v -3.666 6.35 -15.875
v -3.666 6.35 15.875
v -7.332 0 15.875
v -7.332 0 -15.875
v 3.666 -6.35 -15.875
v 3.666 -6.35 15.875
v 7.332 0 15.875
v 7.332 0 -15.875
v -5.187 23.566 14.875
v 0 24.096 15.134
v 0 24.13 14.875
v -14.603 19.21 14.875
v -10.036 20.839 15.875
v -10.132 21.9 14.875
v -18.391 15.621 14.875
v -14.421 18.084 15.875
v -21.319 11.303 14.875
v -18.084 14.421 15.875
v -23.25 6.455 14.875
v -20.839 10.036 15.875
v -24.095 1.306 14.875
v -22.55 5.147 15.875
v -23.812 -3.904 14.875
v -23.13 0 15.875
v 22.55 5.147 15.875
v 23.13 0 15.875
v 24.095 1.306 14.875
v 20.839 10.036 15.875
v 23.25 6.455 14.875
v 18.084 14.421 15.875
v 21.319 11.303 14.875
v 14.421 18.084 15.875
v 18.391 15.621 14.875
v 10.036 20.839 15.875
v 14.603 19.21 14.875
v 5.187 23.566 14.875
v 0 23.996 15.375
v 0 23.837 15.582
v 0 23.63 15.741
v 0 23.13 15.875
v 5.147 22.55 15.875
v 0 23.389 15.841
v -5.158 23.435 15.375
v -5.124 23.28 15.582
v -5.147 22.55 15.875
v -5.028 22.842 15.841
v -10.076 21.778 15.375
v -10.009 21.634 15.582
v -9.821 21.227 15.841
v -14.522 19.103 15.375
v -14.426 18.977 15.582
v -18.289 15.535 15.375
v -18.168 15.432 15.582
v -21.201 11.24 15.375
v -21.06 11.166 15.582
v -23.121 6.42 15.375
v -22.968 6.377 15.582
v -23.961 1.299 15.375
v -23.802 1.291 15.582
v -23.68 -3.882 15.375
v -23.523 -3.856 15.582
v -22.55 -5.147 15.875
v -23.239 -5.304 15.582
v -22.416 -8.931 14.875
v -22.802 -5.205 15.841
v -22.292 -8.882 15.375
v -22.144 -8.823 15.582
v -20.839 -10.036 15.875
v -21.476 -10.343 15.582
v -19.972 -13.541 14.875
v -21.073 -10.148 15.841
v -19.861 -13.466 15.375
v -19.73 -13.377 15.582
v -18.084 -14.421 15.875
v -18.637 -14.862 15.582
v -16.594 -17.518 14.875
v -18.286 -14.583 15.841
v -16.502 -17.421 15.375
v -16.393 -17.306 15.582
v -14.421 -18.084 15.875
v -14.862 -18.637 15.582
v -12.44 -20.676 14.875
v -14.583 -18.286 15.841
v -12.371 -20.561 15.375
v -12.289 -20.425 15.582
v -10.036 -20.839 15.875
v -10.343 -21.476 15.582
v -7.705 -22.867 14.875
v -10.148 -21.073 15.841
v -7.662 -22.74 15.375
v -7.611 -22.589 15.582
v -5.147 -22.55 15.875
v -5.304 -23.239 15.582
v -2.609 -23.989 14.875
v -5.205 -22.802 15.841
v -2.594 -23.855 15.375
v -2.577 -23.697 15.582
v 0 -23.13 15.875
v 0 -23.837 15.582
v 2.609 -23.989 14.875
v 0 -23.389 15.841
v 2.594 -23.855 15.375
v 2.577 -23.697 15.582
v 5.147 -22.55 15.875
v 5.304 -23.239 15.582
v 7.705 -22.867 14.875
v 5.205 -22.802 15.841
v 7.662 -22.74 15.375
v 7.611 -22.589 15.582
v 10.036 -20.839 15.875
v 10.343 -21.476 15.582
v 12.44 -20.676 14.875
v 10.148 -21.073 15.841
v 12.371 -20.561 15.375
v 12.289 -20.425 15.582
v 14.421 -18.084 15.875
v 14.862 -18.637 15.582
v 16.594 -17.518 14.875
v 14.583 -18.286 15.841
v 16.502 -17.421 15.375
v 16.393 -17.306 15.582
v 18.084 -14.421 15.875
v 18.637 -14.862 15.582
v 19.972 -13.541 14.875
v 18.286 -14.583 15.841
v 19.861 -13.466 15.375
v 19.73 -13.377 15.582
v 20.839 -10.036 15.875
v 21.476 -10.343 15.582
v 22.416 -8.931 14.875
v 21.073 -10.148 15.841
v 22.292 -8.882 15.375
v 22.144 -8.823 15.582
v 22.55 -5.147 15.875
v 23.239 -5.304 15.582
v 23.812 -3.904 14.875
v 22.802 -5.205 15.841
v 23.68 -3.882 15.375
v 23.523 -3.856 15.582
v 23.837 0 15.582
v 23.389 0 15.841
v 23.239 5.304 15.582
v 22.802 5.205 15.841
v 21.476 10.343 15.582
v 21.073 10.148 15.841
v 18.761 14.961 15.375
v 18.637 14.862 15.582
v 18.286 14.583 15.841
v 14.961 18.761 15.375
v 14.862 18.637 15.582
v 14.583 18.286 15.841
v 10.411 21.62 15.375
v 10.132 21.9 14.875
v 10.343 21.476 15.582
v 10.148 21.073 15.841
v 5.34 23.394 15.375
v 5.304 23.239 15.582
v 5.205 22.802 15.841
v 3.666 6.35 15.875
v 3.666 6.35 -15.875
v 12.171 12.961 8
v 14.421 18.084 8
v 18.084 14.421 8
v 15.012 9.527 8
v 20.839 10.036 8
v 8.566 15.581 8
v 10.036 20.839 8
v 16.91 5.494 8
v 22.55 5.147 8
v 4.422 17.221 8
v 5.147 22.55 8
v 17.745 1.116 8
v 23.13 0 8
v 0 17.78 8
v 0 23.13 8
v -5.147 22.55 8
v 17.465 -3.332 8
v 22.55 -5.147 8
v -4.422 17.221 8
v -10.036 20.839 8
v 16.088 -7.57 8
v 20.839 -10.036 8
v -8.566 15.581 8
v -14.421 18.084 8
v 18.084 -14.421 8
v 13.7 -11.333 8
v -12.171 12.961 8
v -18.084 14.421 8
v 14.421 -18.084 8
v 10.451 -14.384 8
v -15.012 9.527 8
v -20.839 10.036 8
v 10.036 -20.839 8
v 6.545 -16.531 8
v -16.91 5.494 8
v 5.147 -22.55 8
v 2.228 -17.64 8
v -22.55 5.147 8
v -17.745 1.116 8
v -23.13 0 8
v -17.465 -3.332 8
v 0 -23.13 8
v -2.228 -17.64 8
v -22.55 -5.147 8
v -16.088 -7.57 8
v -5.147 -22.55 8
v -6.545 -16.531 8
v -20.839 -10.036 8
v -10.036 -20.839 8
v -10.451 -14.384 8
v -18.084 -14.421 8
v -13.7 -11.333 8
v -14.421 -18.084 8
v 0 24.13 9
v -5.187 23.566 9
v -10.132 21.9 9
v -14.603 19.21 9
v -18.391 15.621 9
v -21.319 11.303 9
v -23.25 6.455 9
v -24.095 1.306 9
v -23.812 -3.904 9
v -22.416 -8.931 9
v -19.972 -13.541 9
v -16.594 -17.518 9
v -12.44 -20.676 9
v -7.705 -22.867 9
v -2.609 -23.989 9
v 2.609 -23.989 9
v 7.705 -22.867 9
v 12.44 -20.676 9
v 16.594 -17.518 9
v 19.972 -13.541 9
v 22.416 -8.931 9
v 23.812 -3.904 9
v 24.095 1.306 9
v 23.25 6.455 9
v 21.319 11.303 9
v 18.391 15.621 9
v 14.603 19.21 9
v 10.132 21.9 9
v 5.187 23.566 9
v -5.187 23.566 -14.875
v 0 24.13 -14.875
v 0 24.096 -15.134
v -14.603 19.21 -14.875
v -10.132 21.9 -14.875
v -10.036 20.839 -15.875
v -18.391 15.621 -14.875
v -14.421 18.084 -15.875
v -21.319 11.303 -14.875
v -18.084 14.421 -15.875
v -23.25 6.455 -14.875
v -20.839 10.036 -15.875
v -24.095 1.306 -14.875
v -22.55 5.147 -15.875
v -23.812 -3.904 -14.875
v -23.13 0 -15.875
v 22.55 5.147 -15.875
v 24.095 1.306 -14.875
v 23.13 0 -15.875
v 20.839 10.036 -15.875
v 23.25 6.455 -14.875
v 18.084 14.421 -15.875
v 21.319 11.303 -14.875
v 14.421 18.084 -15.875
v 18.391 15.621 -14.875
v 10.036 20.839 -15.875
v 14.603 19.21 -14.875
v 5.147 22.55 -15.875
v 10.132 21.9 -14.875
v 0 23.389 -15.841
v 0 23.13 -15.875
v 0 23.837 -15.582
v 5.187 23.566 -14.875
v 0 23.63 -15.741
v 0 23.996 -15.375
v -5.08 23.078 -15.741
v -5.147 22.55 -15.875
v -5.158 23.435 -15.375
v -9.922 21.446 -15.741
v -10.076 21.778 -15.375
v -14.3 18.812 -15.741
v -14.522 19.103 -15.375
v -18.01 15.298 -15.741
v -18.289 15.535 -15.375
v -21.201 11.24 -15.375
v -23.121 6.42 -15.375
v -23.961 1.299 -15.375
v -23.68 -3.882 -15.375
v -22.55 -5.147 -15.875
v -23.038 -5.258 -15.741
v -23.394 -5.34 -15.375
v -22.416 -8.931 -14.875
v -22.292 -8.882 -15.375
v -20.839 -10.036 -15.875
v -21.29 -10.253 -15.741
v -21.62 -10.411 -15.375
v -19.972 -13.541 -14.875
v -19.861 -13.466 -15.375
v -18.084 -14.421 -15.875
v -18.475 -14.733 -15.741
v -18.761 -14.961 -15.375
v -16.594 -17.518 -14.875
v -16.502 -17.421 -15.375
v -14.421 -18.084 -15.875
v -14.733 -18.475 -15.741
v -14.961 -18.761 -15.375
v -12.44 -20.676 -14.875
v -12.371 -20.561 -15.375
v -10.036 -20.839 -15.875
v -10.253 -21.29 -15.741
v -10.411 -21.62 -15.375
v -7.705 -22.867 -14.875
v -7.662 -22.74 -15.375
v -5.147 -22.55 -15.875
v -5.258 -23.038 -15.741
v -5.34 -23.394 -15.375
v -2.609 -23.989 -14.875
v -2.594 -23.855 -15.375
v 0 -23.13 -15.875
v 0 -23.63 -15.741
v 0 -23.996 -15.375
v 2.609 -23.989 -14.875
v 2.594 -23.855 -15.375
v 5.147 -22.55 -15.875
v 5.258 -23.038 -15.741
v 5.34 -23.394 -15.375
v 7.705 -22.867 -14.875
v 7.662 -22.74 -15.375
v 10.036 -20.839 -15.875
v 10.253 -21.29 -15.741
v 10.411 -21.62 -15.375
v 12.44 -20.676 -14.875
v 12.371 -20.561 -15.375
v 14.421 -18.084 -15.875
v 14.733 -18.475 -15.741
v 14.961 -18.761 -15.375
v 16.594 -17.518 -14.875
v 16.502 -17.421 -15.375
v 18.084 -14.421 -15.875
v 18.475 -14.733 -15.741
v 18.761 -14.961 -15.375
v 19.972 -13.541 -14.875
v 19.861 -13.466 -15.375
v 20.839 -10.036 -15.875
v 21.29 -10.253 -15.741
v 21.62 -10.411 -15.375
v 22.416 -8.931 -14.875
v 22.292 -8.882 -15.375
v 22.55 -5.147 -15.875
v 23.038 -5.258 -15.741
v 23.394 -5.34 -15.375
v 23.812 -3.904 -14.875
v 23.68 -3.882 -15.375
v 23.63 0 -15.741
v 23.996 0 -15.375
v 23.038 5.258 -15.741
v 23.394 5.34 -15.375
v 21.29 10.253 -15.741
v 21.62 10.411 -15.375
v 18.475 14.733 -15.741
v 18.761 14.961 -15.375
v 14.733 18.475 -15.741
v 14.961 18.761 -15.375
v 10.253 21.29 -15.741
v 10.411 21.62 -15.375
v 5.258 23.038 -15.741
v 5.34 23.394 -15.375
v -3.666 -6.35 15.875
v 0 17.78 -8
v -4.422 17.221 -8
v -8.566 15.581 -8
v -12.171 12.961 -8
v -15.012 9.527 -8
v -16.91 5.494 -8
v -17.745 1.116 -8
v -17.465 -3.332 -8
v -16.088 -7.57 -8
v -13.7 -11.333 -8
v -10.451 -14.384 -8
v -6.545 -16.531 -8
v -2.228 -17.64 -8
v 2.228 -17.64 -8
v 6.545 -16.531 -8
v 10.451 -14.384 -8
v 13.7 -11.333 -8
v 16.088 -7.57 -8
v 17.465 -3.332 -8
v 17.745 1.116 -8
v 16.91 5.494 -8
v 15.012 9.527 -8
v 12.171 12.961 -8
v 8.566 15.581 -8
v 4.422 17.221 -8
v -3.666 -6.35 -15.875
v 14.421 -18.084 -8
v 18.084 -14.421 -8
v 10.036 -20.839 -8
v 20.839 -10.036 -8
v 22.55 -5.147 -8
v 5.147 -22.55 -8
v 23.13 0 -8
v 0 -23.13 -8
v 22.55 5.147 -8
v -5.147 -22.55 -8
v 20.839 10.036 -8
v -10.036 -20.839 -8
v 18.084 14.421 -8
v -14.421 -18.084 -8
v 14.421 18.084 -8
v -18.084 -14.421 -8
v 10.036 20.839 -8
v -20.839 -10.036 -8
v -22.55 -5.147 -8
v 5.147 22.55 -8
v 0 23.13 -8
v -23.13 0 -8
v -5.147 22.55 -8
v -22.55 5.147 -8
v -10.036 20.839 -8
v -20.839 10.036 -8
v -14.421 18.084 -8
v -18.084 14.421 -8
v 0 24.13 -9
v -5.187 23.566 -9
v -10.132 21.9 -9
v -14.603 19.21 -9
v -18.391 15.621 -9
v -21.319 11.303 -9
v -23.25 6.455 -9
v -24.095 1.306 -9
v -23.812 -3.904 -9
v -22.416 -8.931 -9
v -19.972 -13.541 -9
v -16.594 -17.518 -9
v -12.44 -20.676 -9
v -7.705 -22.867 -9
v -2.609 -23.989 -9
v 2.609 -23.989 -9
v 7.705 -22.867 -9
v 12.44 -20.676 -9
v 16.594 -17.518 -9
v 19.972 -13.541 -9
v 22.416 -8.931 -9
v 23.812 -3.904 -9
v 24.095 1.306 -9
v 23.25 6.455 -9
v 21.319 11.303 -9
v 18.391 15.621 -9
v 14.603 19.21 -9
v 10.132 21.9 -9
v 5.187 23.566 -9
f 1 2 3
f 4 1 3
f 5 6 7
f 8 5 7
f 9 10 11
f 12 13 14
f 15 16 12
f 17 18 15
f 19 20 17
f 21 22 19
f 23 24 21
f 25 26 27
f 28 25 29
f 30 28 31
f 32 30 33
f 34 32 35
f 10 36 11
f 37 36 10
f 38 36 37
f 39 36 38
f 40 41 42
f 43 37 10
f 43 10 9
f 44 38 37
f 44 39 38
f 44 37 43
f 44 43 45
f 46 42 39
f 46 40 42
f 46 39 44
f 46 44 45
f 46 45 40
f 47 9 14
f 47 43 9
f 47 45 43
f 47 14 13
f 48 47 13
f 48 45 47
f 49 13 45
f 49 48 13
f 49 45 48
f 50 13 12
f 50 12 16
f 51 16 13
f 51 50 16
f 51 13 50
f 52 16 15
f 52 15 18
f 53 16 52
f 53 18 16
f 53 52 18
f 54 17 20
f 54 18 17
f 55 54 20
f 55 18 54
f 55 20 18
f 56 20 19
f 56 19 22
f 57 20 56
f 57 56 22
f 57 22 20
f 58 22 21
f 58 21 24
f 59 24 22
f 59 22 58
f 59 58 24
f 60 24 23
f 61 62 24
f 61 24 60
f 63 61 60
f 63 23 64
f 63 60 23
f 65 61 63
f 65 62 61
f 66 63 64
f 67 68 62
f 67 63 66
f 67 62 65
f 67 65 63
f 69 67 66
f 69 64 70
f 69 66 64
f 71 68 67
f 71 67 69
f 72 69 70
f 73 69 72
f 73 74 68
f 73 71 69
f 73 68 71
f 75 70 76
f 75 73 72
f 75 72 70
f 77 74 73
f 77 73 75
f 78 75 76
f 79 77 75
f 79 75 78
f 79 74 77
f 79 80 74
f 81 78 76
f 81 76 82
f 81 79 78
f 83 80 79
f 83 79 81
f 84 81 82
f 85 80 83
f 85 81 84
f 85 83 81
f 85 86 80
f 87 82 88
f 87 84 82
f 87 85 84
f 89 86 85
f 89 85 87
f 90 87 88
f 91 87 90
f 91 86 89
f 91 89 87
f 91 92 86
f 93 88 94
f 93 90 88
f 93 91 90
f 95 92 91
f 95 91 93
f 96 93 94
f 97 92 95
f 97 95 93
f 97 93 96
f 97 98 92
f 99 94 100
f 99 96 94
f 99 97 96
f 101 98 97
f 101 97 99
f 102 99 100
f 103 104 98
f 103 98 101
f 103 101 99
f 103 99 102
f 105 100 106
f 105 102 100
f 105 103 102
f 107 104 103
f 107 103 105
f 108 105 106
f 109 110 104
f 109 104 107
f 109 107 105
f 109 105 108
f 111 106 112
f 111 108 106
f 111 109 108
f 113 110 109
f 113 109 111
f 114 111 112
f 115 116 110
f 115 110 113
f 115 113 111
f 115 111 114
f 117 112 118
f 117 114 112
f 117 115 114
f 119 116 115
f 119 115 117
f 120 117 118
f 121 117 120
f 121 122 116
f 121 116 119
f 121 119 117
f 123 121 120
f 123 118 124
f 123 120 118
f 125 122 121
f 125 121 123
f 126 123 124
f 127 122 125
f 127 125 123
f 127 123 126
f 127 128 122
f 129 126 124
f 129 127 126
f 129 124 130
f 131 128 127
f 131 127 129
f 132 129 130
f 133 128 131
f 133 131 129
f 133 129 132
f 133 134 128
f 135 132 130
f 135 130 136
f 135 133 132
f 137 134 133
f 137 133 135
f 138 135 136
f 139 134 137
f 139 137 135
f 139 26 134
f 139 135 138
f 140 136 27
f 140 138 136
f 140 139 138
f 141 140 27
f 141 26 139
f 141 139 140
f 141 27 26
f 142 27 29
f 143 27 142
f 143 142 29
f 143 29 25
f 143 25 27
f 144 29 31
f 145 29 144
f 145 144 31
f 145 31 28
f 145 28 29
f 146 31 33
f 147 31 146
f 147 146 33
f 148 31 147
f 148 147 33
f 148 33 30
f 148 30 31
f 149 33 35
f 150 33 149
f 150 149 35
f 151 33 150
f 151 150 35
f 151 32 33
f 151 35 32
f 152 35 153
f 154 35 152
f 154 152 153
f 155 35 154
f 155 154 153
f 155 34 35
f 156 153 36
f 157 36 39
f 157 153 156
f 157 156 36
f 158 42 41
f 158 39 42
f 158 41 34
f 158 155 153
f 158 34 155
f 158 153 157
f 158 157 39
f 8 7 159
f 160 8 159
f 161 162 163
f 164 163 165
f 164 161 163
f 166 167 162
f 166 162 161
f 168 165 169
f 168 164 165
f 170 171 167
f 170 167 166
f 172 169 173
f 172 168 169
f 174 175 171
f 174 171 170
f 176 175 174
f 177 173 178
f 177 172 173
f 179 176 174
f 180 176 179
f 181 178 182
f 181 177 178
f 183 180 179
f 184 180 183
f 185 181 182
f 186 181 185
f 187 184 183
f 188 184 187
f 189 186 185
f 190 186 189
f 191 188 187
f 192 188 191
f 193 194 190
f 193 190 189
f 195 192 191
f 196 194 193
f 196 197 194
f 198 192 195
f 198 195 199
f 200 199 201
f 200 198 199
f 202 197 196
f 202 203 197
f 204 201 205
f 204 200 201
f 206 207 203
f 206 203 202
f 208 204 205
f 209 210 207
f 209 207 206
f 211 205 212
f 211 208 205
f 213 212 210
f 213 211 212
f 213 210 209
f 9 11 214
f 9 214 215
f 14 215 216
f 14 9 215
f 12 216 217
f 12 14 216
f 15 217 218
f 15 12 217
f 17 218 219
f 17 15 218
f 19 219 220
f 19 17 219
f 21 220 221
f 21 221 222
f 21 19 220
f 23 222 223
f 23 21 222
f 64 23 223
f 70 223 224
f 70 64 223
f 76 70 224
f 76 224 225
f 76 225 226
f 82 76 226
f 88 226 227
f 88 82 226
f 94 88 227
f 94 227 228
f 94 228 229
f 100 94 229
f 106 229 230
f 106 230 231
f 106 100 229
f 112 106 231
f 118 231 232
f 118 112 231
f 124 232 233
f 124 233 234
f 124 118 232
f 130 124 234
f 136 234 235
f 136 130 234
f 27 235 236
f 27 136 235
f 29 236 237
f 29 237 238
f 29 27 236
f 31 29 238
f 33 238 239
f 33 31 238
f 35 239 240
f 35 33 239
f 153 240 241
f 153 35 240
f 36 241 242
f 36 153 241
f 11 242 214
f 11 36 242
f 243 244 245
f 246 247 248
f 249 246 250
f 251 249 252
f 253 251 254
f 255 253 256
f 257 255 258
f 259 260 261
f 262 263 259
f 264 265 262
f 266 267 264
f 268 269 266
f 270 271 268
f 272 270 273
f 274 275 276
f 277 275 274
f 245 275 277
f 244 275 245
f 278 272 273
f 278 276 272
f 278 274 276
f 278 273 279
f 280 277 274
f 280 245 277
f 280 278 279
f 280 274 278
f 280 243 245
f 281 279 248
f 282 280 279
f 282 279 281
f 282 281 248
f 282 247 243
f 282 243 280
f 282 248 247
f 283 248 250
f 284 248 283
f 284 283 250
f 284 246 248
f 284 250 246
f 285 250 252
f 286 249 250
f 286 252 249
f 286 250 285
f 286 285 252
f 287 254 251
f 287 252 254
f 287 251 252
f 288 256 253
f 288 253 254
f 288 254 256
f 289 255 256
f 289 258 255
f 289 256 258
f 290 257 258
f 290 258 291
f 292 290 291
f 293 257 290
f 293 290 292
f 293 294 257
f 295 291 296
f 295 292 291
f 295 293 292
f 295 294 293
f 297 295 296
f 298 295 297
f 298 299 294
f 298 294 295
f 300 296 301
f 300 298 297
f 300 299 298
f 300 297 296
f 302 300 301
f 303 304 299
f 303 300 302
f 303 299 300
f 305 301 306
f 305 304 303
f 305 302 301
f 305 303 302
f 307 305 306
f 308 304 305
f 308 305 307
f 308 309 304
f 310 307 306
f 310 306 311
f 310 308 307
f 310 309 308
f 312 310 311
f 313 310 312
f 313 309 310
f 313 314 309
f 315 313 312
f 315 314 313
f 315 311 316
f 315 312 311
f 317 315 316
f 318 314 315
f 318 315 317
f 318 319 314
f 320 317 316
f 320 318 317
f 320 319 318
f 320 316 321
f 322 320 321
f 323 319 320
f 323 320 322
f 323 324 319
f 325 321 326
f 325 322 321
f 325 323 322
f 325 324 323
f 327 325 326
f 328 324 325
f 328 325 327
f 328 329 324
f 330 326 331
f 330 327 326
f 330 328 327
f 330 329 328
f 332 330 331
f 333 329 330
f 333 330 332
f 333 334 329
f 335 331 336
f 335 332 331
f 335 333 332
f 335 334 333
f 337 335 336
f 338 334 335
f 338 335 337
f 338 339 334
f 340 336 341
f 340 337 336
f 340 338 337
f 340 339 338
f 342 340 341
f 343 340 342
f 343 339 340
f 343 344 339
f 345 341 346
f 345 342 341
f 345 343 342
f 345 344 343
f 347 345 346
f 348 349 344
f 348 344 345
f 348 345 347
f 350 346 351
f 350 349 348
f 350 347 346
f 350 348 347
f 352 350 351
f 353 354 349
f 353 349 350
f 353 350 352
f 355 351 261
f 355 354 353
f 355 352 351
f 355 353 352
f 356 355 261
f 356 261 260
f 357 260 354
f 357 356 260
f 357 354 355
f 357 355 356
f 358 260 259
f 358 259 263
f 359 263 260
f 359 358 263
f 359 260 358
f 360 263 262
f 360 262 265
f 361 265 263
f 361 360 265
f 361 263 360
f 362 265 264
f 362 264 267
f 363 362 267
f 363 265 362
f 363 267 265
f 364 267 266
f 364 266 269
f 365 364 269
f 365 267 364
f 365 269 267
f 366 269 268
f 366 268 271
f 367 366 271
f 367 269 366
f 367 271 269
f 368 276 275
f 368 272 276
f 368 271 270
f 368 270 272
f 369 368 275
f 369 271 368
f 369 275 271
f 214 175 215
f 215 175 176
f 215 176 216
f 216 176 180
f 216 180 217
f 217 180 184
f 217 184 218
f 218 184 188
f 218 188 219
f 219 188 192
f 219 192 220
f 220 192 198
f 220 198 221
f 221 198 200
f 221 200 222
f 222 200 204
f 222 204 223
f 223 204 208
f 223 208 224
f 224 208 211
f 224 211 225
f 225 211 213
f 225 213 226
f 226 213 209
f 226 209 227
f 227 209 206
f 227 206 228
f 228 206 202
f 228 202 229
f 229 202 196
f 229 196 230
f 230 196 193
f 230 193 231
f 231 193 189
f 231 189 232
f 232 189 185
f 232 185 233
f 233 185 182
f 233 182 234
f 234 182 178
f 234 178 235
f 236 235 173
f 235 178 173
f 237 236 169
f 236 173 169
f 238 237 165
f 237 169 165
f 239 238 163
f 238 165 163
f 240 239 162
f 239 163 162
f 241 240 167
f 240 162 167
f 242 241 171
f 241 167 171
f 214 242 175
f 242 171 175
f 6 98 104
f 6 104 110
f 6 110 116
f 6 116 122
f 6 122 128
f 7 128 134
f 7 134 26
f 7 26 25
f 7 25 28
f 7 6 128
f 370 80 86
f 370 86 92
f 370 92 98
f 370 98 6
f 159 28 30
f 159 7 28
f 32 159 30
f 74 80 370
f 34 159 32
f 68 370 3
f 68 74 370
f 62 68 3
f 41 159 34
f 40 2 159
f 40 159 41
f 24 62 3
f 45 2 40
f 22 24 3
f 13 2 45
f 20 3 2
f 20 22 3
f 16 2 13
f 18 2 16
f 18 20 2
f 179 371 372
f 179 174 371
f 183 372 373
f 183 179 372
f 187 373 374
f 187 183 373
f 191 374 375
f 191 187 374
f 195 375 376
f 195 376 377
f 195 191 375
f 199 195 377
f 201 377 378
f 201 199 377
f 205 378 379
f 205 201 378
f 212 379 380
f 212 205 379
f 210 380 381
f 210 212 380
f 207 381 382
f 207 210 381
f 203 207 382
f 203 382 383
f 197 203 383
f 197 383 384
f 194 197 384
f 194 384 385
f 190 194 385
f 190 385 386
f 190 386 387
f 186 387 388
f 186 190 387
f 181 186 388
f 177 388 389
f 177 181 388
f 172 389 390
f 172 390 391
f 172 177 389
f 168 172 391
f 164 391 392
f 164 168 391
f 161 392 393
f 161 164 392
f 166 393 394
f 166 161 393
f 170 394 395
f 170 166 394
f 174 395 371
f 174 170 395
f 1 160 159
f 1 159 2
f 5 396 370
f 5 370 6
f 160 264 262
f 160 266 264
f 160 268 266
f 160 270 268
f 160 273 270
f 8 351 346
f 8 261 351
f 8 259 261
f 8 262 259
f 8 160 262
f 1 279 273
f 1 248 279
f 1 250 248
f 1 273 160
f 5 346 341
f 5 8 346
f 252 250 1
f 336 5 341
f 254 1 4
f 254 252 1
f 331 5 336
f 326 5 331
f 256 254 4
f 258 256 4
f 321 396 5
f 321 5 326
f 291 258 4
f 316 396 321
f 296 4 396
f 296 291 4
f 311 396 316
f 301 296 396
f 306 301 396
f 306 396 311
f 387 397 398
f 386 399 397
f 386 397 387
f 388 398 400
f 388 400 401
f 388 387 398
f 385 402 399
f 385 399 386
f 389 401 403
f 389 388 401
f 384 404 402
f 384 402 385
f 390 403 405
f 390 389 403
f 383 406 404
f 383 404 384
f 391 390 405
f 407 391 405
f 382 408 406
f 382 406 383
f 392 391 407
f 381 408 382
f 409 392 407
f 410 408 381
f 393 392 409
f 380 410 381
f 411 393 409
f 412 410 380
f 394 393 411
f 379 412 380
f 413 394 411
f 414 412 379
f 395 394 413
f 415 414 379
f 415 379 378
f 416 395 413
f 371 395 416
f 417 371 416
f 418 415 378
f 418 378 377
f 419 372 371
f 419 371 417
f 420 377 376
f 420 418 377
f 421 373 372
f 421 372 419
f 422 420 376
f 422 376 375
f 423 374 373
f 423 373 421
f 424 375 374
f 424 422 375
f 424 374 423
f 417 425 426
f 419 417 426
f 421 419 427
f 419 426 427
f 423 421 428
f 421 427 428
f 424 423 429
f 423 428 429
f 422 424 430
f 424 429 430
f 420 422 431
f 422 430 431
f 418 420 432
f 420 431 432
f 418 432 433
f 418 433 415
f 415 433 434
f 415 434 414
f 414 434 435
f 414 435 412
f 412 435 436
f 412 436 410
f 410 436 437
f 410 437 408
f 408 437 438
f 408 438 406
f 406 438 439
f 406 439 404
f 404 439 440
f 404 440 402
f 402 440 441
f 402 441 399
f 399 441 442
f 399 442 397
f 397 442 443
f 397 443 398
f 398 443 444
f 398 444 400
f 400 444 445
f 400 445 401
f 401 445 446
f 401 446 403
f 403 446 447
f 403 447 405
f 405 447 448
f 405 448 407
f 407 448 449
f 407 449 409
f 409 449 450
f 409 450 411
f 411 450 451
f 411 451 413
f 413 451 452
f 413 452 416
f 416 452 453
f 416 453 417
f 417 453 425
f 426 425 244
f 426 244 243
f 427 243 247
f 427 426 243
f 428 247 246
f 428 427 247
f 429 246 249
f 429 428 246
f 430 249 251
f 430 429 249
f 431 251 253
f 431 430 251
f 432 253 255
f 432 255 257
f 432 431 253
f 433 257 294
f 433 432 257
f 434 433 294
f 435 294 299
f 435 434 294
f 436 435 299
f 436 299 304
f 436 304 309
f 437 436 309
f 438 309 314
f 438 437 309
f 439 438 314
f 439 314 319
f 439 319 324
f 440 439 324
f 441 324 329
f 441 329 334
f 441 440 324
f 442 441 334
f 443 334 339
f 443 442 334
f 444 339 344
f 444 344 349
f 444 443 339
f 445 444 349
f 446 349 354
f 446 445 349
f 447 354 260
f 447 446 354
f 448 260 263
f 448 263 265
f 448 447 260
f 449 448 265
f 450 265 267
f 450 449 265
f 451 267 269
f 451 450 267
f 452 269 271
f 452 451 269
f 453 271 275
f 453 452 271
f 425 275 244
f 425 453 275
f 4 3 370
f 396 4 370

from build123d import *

# Parameters (mm, degrees)
FILLET1_R               = 1
CHAMFER1_SIZE           = 1
CUT_EXTRUDE1_DEPTH      = 47.610903231
CUT_EXTRUDE1_DEPTH_BACK = 47.610903231


with BuildPart() as part:
    # Sketch1 → Revolve3 (revolve)
    with BuildSketch(Plane(origin=(0, 0, 0), x_dir=(0, 0, -1), z_dir=(1, 0, 0))):
        Polygon((0, 0), (0, 17.78), (-8, 17.78), (-8, 24.13), (-15.875, 24.13), (-15.875, 0), align=None)
        Polygon((8, 17.78), (0, 17.78), (0, 0), (15.875, 0), (15.875, 24.13), (8, 24.13), align=None)
    revolve(axis=Axis((0, 0, -15.875), (0, 0, 1)))

    # Fillet1
    fillet1_edges = [part.edges().sort_by_distance(p)[0] for p in [
        (0, -24.13, -15.875),
        (0, -24.13, 15.875),
    ]]
    fillet(fillet1_edges, radius=FILLET1_R)

    # Chamfer1
    chamfer1_edges = [part.edges().sort_by_distance(p)[0] for p in [
        (0, -24.13, -8),
        (0, -24.13, 8),
    ]]
    chamfer(chamfer1_edges, length=CHAMFER1_SIZE)

    # Sketch2 → Cut-Extrude1 (cut, two sides: drawn at the far end of the back side and taken through both)
    with BuildSketch(Plane.XY.offset(15.875).offset(-CUT_EXTRUDE1_DEPTH_BACK)):
        Polygon((7.332348419, 0), (3.666174209, 6.35), (-3.666174209, 6.35), (-7.332348419, 0), (-3.666174209, -6.35), (3.666174209, -6.35), align=None)
    extrude(amount=CUT_EXTRUDE1_DEPTH + CUT_EXTRUDE1_DEPTH_BACK, mode=Mode.SUBTRACT)


solid = part.part
